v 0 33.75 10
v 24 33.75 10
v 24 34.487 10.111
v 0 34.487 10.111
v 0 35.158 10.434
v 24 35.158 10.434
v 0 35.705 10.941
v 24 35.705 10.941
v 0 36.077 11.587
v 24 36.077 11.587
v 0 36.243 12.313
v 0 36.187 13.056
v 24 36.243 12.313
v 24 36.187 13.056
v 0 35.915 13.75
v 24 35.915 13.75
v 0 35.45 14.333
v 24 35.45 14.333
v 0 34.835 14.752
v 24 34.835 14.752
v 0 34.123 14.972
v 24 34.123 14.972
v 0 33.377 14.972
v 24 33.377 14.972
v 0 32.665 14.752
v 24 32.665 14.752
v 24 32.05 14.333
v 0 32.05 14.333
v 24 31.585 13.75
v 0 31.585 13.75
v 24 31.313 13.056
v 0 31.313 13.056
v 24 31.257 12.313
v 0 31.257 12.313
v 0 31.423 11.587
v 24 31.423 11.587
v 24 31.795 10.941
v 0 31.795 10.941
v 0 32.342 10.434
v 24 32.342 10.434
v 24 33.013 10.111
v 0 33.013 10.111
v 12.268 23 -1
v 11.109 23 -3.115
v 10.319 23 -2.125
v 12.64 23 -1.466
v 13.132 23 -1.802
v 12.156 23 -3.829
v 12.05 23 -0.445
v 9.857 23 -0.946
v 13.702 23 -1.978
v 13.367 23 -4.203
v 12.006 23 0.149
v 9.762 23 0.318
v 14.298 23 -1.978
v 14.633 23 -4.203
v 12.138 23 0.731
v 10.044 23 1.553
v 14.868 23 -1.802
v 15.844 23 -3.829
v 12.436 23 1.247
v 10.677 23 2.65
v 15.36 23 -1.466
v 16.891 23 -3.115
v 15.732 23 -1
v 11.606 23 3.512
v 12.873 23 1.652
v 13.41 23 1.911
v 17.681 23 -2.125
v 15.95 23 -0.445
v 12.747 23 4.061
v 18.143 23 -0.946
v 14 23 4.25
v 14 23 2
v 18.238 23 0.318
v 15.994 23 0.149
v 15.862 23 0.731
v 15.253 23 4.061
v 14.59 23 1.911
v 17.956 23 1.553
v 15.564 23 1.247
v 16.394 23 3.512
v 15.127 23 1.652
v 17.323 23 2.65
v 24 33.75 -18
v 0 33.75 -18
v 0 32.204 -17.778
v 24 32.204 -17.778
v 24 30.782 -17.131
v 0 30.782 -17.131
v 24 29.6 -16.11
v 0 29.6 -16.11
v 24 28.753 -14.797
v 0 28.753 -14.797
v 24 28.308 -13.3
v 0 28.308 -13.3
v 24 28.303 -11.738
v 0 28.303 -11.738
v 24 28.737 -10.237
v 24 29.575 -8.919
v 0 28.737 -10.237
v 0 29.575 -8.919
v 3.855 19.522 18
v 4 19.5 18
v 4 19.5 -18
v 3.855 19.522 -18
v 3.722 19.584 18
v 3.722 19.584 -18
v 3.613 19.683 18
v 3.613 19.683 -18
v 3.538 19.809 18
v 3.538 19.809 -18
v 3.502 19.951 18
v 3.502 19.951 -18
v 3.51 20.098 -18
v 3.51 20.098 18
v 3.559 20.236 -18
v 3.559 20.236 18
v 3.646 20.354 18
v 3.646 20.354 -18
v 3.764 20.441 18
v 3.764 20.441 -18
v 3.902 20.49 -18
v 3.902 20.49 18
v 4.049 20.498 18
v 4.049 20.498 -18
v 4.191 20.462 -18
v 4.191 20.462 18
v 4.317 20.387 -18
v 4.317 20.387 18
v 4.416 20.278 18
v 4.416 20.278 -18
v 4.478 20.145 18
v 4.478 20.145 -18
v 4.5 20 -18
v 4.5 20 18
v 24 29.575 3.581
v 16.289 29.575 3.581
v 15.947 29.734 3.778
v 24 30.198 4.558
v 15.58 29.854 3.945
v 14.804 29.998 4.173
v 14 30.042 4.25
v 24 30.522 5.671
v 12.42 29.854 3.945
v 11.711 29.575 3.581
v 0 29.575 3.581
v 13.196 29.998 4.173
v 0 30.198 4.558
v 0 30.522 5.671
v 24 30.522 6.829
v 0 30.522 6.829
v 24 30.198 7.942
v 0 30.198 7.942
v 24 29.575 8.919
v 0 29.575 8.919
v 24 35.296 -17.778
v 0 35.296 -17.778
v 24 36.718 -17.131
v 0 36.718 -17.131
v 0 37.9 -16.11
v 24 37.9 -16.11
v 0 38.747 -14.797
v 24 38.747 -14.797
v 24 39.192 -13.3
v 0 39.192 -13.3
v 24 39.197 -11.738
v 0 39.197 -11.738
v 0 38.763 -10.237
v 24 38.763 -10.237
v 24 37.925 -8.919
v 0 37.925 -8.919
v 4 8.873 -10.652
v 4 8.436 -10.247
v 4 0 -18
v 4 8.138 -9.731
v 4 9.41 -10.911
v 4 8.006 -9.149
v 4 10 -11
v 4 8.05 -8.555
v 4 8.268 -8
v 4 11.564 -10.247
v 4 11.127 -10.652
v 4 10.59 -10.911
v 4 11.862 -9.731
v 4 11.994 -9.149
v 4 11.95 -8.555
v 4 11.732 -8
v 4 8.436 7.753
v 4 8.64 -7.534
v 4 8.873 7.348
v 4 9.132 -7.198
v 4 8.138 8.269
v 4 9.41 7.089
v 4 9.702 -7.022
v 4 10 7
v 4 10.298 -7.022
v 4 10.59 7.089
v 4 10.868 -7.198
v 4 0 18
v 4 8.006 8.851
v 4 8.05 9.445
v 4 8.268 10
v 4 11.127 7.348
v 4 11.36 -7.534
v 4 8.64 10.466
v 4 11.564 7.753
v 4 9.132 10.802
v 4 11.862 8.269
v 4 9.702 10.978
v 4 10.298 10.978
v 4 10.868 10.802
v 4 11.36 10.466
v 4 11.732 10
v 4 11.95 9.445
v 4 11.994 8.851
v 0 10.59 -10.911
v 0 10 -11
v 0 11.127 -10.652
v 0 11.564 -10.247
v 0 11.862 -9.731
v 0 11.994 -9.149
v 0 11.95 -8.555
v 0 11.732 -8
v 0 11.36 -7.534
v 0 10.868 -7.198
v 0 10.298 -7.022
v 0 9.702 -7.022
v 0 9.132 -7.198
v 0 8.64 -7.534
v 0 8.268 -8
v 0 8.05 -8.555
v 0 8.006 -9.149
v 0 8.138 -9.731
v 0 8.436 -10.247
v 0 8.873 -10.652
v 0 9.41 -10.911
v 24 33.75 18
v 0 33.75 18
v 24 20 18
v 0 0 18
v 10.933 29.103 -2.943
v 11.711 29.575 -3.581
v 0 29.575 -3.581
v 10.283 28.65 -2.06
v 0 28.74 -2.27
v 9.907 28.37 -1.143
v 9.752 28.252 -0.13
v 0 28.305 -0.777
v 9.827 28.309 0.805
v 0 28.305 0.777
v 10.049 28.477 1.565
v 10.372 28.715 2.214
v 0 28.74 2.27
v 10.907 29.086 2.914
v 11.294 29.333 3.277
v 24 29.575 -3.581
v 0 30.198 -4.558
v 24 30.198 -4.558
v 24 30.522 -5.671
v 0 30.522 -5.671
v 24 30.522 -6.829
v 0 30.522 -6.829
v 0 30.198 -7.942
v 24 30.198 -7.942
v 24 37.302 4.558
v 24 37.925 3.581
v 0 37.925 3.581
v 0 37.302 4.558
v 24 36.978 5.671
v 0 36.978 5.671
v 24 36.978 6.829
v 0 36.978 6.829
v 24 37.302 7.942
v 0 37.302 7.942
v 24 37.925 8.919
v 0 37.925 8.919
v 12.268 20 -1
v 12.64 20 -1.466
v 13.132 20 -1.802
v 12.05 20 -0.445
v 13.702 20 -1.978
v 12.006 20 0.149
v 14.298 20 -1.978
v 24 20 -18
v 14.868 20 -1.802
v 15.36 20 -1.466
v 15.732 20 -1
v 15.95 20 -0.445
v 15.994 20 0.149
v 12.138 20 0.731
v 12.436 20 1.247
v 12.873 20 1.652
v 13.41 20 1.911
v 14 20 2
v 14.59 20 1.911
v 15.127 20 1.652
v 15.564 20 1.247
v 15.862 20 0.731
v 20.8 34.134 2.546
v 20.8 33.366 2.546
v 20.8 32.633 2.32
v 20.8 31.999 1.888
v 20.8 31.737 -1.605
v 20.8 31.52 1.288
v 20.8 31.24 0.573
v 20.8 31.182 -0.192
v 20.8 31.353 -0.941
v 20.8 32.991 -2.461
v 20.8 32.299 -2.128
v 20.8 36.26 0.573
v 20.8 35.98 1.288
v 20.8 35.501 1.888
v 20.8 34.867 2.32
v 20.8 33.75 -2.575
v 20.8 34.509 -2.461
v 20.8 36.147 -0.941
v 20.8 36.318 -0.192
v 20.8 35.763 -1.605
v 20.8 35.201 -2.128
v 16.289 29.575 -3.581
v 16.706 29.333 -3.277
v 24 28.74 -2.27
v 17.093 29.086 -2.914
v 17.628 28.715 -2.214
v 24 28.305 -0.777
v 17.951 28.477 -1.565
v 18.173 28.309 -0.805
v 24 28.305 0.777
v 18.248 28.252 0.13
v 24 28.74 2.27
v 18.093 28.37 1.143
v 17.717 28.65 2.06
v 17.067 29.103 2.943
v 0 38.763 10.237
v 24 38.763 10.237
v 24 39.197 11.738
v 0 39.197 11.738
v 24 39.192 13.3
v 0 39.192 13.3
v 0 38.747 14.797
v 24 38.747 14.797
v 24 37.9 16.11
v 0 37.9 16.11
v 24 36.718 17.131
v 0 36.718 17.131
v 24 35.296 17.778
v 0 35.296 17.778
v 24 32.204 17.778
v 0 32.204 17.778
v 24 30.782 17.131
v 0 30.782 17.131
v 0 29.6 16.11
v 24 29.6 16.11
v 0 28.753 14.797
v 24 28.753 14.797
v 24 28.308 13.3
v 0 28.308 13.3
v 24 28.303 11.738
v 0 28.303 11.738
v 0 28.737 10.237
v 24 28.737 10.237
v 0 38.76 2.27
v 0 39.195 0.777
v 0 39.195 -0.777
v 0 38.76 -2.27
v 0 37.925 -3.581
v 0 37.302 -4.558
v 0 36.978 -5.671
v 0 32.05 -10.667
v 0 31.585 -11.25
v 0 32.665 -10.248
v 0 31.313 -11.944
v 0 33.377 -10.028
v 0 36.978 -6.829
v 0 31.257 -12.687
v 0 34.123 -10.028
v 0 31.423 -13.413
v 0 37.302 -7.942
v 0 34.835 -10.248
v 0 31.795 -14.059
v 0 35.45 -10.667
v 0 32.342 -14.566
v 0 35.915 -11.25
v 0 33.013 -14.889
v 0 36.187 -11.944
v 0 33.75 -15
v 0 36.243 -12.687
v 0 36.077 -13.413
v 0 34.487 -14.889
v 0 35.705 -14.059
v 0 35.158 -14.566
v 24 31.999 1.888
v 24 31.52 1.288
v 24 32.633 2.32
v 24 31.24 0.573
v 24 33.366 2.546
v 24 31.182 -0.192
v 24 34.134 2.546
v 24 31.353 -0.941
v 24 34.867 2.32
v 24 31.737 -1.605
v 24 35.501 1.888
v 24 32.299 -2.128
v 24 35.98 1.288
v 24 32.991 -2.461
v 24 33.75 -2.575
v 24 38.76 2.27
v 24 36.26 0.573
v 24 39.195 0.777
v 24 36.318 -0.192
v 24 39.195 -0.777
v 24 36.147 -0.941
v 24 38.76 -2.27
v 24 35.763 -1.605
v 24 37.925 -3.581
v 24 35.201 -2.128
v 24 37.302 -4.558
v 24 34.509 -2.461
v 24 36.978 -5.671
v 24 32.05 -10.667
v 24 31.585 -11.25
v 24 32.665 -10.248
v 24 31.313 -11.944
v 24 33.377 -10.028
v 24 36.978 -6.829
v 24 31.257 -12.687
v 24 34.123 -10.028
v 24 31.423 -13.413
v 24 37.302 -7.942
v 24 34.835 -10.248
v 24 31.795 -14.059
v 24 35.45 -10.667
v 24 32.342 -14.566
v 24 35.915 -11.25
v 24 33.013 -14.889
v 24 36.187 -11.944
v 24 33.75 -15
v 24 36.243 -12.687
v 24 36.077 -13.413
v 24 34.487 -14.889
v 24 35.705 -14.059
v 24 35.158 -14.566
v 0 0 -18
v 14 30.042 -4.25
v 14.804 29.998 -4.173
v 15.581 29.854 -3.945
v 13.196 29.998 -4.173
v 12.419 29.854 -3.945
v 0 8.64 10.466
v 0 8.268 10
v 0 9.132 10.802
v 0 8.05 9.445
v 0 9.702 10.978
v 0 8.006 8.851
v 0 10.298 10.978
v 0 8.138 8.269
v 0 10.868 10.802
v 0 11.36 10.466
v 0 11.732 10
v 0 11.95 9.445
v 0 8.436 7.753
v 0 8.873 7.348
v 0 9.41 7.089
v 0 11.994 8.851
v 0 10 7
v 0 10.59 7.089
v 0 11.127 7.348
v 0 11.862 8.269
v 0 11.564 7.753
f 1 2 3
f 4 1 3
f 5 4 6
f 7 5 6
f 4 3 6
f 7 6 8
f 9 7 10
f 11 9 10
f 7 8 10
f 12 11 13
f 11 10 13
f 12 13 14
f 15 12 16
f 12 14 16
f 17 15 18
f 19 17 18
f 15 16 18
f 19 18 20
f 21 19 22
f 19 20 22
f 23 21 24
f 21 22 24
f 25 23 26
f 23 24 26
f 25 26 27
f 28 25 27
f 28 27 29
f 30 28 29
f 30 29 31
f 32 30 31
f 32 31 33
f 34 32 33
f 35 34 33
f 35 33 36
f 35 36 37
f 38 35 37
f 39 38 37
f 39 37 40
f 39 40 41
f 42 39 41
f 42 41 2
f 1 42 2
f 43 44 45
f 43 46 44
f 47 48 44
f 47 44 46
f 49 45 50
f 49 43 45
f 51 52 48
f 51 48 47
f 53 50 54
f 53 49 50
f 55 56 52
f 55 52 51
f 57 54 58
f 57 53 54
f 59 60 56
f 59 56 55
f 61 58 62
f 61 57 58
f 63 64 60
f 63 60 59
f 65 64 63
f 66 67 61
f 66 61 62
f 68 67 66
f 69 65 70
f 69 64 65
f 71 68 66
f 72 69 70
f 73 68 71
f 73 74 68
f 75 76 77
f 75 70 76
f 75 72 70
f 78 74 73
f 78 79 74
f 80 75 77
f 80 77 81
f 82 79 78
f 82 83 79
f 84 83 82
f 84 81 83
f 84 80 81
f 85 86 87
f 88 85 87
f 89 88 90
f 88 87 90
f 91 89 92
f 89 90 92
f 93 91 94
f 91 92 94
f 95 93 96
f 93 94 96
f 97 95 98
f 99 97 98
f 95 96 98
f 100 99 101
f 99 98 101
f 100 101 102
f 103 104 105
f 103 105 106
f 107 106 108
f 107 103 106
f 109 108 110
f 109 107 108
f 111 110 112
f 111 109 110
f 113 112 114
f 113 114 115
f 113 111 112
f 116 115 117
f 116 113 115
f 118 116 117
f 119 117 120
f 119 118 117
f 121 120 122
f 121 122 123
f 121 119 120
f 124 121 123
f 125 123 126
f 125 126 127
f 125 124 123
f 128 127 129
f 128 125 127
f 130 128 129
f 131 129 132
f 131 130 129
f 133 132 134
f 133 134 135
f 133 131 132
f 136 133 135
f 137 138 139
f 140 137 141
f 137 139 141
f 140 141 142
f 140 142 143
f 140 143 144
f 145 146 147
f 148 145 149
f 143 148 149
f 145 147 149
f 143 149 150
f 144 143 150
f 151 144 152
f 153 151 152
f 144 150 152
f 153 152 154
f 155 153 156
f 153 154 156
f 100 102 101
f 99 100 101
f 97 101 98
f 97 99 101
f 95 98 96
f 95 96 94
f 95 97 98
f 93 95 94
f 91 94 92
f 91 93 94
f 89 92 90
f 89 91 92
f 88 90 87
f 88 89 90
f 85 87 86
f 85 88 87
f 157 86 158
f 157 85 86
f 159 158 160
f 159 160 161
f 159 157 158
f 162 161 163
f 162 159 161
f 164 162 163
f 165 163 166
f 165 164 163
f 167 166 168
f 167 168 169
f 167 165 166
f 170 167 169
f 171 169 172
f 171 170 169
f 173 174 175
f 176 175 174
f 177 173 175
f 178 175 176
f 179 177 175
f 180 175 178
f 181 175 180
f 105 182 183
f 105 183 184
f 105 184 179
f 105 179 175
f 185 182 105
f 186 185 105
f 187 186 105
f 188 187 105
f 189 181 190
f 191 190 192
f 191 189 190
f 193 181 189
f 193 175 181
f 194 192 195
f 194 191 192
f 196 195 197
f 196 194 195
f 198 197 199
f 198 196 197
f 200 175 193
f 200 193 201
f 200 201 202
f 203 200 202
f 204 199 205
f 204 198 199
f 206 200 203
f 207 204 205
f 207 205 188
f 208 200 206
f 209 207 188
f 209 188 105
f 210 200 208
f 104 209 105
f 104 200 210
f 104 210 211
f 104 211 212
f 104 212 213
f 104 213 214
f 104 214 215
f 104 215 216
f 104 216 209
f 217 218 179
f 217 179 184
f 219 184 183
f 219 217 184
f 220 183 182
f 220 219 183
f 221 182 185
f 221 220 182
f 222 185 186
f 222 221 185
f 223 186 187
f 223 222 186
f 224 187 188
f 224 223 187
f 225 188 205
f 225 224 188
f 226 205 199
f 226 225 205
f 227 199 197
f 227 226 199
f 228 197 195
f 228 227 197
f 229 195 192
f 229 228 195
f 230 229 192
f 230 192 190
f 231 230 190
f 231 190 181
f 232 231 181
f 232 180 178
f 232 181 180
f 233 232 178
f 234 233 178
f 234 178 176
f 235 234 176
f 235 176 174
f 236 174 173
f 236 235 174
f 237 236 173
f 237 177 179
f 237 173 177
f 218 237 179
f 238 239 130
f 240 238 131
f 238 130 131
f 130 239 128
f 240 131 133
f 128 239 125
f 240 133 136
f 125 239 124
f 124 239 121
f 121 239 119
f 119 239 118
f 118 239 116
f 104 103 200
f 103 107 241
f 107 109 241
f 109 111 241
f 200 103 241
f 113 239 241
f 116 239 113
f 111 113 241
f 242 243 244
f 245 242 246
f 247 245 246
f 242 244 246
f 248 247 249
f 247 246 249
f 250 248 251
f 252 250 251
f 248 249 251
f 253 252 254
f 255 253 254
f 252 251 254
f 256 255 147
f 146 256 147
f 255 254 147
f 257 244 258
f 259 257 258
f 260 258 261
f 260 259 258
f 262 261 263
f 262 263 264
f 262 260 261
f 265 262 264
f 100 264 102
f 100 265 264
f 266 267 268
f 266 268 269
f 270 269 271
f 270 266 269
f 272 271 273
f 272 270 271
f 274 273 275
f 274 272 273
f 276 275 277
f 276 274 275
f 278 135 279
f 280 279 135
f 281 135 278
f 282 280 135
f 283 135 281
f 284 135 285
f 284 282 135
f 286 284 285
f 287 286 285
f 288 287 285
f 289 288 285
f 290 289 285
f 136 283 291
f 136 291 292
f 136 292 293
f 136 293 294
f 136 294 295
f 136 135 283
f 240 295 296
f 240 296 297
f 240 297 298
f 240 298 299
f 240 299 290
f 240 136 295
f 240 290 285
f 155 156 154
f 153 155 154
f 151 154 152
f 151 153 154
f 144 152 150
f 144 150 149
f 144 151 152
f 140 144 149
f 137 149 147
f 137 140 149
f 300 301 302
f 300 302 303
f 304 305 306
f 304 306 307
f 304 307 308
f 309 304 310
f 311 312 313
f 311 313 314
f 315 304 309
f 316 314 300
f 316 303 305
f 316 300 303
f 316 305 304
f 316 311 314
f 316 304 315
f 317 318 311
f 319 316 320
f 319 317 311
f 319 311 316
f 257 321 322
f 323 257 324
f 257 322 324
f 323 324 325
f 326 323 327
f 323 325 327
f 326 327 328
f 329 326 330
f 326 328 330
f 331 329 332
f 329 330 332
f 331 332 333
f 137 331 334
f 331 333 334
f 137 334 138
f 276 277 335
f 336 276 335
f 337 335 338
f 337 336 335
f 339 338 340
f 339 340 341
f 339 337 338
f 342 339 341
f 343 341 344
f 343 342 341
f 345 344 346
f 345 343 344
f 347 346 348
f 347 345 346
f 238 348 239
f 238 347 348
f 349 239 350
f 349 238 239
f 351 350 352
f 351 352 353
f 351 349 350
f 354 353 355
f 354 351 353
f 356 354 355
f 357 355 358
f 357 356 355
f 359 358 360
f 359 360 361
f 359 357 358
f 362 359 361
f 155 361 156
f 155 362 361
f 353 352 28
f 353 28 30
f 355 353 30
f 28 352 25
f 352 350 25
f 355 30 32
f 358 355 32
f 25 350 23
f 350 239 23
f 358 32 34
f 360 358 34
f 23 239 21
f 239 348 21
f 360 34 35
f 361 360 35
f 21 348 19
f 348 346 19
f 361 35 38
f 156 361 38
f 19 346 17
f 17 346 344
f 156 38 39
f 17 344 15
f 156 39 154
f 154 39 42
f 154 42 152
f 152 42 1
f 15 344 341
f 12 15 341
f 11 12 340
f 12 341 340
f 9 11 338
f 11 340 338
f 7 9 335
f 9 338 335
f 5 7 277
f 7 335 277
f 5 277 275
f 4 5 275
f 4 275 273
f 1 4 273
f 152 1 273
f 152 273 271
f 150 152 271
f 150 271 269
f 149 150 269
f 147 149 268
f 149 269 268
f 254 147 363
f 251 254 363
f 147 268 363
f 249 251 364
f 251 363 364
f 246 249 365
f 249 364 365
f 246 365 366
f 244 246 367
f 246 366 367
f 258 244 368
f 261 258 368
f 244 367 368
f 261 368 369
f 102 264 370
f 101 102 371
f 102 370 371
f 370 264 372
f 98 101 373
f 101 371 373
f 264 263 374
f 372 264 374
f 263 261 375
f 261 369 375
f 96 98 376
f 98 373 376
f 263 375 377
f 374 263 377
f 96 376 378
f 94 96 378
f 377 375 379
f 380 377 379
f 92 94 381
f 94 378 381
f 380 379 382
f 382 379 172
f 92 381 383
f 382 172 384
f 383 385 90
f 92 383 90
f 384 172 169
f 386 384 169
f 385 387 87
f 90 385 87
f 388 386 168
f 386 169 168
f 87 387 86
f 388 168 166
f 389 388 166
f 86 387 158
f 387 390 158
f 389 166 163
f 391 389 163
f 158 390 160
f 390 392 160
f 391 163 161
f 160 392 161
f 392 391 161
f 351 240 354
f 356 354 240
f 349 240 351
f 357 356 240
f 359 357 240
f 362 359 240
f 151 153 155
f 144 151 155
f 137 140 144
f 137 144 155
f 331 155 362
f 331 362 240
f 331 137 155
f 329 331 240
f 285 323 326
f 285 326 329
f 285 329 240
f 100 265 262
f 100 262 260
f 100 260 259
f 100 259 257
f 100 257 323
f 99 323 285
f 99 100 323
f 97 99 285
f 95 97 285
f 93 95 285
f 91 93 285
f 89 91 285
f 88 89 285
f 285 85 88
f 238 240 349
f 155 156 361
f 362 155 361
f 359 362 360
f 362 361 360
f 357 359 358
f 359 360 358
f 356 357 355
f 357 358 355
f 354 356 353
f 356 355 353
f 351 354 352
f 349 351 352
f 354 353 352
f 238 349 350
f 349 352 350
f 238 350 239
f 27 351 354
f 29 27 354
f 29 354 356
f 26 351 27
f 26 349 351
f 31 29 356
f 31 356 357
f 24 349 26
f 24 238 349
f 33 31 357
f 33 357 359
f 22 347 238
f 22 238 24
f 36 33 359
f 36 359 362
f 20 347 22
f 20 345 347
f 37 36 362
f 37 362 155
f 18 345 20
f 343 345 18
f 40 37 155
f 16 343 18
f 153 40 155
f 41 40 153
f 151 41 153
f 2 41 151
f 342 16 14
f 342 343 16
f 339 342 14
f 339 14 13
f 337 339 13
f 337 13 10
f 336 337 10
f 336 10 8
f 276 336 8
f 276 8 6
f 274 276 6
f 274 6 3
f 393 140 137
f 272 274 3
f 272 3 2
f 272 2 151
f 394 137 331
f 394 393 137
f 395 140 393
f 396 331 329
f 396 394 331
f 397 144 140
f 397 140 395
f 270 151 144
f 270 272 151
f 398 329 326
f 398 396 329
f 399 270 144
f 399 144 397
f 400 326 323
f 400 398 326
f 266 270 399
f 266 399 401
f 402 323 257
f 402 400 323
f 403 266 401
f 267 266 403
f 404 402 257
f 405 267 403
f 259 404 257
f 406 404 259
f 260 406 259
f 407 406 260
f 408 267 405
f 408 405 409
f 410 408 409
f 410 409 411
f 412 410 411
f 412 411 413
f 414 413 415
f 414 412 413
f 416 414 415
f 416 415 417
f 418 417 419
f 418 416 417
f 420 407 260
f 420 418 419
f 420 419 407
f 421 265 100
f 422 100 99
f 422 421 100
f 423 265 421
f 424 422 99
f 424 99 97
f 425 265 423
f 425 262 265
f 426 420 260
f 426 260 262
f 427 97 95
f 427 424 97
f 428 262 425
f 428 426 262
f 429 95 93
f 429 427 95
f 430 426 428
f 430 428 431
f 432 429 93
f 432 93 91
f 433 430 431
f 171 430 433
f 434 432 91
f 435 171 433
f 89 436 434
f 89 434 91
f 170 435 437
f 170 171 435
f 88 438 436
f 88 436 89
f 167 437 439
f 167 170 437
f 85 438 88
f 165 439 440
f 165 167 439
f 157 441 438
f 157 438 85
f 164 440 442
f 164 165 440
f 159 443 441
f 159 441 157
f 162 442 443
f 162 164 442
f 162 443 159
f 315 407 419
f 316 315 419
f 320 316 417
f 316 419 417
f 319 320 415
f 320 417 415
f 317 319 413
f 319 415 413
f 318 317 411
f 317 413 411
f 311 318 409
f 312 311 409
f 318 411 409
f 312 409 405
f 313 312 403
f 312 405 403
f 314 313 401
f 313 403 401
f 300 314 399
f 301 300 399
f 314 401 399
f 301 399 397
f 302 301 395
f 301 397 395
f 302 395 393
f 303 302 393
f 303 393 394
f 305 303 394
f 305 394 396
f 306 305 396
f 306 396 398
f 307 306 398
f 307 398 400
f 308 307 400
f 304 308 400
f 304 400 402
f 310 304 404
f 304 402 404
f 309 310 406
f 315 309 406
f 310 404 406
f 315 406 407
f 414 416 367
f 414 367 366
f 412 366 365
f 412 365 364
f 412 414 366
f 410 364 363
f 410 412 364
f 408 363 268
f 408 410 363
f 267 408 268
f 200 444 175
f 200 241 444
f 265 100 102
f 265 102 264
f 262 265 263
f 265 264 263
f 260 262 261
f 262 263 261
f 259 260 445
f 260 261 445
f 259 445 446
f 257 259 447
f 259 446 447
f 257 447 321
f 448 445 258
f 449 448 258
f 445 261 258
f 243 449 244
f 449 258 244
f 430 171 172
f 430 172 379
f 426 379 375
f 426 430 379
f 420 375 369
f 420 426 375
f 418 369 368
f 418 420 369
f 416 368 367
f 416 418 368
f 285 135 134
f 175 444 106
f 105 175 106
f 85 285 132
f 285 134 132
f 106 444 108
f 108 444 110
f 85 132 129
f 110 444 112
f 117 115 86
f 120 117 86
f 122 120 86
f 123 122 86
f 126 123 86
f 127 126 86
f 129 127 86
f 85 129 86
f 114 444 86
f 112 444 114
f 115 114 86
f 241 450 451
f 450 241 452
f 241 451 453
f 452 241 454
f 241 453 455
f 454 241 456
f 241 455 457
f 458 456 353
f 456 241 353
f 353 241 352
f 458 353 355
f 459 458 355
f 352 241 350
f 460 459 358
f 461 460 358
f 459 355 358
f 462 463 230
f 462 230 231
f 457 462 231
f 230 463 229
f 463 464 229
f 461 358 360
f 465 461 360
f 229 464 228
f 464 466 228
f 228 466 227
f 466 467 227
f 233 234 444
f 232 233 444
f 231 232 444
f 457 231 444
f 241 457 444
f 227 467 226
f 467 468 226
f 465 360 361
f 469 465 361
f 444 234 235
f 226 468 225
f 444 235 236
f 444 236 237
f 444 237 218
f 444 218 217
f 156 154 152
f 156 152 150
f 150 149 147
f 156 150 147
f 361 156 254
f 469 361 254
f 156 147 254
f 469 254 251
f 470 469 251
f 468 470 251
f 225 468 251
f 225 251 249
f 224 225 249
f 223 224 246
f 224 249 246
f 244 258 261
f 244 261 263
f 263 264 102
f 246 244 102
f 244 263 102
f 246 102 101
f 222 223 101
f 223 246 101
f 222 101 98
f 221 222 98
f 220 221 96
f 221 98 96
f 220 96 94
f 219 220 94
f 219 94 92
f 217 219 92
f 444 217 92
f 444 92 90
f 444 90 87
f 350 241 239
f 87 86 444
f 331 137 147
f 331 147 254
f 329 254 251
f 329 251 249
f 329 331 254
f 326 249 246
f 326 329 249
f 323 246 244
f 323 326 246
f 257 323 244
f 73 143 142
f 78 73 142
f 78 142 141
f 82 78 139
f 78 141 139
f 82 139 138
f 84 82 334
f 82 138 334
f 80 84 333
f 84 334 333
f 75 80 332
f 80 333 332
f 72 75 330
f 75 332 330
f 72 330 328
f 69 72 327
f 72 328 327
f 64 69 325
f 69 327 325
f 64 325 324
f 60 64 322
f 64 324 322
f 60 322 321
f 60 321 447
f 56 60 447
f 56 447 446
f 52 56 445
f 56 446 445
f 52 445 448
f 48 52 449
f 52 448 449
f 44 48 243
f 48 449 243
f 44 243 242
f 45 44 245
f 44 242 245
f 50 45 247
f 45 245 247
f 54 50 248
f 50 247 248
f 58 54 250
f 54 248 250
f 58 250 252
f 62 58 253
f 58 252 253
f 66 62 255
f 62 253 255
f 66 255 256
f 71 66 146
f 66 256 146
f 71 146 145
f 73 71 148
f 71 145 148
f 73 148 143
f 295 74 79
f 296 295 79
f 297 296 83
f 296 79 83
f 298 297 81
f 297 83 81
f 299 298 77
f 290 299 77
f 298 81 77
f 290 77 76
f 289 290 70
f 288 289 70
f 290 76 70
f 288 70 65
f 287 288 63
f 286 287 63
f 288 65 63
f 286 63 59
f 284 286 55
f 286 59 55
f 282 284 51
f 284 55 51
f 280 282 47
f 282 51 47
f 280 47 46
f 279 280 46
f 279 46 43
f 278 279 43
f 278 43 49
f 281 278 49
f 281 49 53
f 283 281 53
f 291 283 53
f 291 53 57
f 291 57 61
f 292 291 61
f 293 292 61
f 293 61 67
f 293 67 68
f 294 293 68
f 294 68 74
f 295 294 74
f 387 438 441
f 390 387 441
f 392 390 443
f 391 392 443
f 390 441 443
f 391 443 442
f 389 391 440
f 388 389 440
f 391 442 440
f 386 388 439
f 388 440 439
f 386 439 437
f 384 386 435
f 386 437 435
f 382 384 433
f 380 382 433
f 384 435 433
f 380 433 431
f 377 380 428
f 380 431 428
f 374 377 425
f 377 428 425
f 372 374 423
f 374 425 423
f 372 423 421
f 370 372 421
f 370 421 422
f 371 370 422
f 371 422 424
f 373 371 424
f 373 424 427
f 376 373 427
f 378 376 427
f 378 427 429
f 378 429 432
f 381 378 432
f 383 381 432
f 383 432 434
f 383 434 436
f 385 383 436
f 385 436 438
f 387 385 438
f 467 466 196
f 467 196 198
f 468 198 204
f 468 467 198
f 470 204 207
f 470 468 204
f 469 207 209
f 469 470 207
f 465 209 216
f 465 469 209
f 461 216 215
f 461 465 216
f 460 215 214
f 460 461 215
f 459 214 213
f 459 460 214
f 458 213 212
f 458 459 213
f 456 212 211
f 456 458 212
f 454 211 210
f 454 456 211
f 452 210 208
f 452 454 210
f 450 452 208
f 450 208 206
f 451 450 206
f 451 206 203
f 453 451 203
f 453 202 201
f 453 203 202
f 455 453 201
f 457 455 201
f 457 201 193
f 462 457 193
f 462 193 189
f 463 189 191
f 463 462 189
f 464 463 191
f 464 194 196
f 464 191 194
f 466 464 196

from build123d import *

# Parameters (mm, degrees)
BOSS_EXTRUDE1_DEPTH     = 18
BOSS_EXTRUDE2_DEPTH     = 24
BOSS_EXTRUDE3_DEPTH     = 24
SKETCH4_R               = 2.5
CUT_EXTRUDE1_DEPTH      = 50.402049553
SKETCH4_3_R             = 2.575
CUT_EXTRUDE2_DEPTH      = 3.2
CUT_EXTRUDE3_DEPTH      = 48.587419556
CUT_EXTRUDE3_DEPTH_BACK = 48.587419556
SKETCH6_R               = 2
SKETCH8_R               = 2
CUT_EXTRUDE4_DEPTH      = 50.402049553
SKETCH8_3_R             = 4.25
SKETCH8_3_R_2           = 2
CUT_EXTRUDE5_DEPTH      = 16.25


with BuildPart() as part:
    # Sketch1 → Boss-Extrude1 (new, symmetric)
    with BuildSketch(Plane.XY):
        with BuildLine():
            Line((0, 0), (4, 0))
            Line((4, 0), (4, 19.5))
            ThreePointArc((4, 19.5), (3.646446609, 20.353553391), (4.5, 20))
            Line((4.5, 20), (24, 20))
            Line((24, 20), (24, 24))
            Line((24, 24), (0, 24))
            Line((0, 24), (0, 0))
        make_face()
    extrude(amount=BOSS_EXTRUDE1_DEPTH, both=True)

    # Sketch9 → Boss-Extrude3 (add)
    with BuildSketch(Plane.ZY):
        with BuildLine():
            Line((-18, 24), (-18, 33.75))
            ThreePointArc((-18, 33.75), (-14.79738869, 28.752800263), (-8.919270833, 29.575269034))
            ThreePointArc((-8.919270833, 29.575269034), (-6.25, 30.56319686), (-3.580729167, 29.575269034))
            ThreePointArc((-3.580729167, 29.575269034), (0, 28.25), (3.580729167, 29.575269034))
            ThreePointArc((3.580729167, 29.575269034), (6.25, 30.56319686), (8.919270833, 29.575269034))
            ThreePointArc((8.919270833, 29.575269034), (14.79738869, 28.752800263), (18, 33.75))
            Line((18, 33.75), (18, 24))
            Line((18, 24), (-18, 24))
        make_face()
    extrude(amount=-BOSS_EXTRUDE3_DEPTH)

    # Sketch6 → Cut-Extrude3 (cut, two sides: drawn at the far end of the back side and taken through both)
    with BuildSketch(Plane(origin=(4, 0, 0), x_dir=(0, 0, -1), z_dir=(1, 0, 0)).offset(-CUT_EXTRUDE3_DEPTH_BACK)):
        with Locations((-9, 10)):
            Circle(SKETCH6_R)
        with Locations((9, 10)):
            Circle(SKETCH6_R)
    extrude(amount=CUT_EXTRUDE3_DEPTH + CUT_EXTRUDE3_DEPTH_BACK, mode=Mode.SUBTRACT)

    # Sketch8 → Cut-Extrude4 (cut, through all)
    with BuildSketch(Plane(origin=(0, 39.25, 0), x_dir=(1, 0, 0), z_dir=(0, 1, 0))):
        with Locations(Location((14, 0, 0), (0, 0, 270))):
            Circle(SKETCH8_R)
    extrude(amount=-CUT_EXTRUDE4_DEPTH, mode=Mode.SUBTRACT)

    # Sketch8<3> → Cut-Extrude5 (cut)
    with BuildSketch(Plane(origin=(0, 39.25, 0), x_dir=(1, 0, 0), z_dir=(0, 1, 0))):
        with Locations(Location((14, 0, 0), (0, 0, 270))):
            Circle(SKETCH8_3_R)
        with Locations(Location((14, 0, 0), (0, 0, 270))):
            Circle(SKETCH8_3_R_2, mode=Mode.SUBTRACT)
    extrude(amount=-CUT_EXTRUDE5_DEPTH, mode=Mode.SUBTRACT)


with BuildPart() as body_2:
    # Sketch3 → Boss-Extrude2 (new body)
    with BuildSketch(Plane.ZY.offset(-24)):
        with BuildLine():
            ThreePointArc((8.919270833, 29.575269034), (6.25, 30.56319686), (3.580729167, 29.575269034))
            ThreePointArc((3.580729167, 29.575269034), (0, 28.25), (-3.580729167, 29.575269034))
            ThreePointArc((-3.580729167, 29.575269034), (-6.25, 30.56319686), (-8.919270833, 29.575269034))
            ThreePointArc((-8.919270833, 29.575269034), (-18, 33.75), (-8.919270833, 37.924730966))
            ThreePointArc((-8.919270833, 37.924730966), (-6.25, 36.93680314), (-3.580729167, 37.924730966))
            ThreePointArc((-3.580729167, 37.924730966), (0, 39.25), (3.580729167, 37.924730966))
            ThreePointArc((3.580729167, 37.924730966), (6.25, 36.93680314), (8.919270833, 37.924730966))
            ThreePointArc((8.919270833, 37.924730966), (18, 33.75), (8.919270833, 29.575269034))
        make_face()
    extrude(amount=BOSS_EXTRUDE2_DEPTH)

    # Sketch4 → Cut-Extrude1 (cut, through all)
    with BuildSketch(Plane(origin=(24, 0, 0), x_dir=(0, 0, -1), z_dir=(1, 0, 0))):
        with Locations((-12.5, 33.75)):
            Circle(SKETCH4_R)
        with Locations((12.5, 33.75)):
            Circle(SKETCH4_R)
    extrude(amount=-CUT_EXTRUDE1_DEPTH, mode=Mode.SUBTRACT)

    # Sketch4<3> → Cut-Extrude2 (cut)
    with BuildSketch(Plane(origin=(24, 0, 0), x_dir=(0, 0, -1), z_dir=(1, 0, 0))):
        with Locations((0, 33.75)):
            Circle(SKETCH4_3_R)
    extrude(amount=-CUT_EXTRUDE2_DEPTH, mode=Mode.SUBTRACT)


solid = Compound([part.part, body_2.part])
